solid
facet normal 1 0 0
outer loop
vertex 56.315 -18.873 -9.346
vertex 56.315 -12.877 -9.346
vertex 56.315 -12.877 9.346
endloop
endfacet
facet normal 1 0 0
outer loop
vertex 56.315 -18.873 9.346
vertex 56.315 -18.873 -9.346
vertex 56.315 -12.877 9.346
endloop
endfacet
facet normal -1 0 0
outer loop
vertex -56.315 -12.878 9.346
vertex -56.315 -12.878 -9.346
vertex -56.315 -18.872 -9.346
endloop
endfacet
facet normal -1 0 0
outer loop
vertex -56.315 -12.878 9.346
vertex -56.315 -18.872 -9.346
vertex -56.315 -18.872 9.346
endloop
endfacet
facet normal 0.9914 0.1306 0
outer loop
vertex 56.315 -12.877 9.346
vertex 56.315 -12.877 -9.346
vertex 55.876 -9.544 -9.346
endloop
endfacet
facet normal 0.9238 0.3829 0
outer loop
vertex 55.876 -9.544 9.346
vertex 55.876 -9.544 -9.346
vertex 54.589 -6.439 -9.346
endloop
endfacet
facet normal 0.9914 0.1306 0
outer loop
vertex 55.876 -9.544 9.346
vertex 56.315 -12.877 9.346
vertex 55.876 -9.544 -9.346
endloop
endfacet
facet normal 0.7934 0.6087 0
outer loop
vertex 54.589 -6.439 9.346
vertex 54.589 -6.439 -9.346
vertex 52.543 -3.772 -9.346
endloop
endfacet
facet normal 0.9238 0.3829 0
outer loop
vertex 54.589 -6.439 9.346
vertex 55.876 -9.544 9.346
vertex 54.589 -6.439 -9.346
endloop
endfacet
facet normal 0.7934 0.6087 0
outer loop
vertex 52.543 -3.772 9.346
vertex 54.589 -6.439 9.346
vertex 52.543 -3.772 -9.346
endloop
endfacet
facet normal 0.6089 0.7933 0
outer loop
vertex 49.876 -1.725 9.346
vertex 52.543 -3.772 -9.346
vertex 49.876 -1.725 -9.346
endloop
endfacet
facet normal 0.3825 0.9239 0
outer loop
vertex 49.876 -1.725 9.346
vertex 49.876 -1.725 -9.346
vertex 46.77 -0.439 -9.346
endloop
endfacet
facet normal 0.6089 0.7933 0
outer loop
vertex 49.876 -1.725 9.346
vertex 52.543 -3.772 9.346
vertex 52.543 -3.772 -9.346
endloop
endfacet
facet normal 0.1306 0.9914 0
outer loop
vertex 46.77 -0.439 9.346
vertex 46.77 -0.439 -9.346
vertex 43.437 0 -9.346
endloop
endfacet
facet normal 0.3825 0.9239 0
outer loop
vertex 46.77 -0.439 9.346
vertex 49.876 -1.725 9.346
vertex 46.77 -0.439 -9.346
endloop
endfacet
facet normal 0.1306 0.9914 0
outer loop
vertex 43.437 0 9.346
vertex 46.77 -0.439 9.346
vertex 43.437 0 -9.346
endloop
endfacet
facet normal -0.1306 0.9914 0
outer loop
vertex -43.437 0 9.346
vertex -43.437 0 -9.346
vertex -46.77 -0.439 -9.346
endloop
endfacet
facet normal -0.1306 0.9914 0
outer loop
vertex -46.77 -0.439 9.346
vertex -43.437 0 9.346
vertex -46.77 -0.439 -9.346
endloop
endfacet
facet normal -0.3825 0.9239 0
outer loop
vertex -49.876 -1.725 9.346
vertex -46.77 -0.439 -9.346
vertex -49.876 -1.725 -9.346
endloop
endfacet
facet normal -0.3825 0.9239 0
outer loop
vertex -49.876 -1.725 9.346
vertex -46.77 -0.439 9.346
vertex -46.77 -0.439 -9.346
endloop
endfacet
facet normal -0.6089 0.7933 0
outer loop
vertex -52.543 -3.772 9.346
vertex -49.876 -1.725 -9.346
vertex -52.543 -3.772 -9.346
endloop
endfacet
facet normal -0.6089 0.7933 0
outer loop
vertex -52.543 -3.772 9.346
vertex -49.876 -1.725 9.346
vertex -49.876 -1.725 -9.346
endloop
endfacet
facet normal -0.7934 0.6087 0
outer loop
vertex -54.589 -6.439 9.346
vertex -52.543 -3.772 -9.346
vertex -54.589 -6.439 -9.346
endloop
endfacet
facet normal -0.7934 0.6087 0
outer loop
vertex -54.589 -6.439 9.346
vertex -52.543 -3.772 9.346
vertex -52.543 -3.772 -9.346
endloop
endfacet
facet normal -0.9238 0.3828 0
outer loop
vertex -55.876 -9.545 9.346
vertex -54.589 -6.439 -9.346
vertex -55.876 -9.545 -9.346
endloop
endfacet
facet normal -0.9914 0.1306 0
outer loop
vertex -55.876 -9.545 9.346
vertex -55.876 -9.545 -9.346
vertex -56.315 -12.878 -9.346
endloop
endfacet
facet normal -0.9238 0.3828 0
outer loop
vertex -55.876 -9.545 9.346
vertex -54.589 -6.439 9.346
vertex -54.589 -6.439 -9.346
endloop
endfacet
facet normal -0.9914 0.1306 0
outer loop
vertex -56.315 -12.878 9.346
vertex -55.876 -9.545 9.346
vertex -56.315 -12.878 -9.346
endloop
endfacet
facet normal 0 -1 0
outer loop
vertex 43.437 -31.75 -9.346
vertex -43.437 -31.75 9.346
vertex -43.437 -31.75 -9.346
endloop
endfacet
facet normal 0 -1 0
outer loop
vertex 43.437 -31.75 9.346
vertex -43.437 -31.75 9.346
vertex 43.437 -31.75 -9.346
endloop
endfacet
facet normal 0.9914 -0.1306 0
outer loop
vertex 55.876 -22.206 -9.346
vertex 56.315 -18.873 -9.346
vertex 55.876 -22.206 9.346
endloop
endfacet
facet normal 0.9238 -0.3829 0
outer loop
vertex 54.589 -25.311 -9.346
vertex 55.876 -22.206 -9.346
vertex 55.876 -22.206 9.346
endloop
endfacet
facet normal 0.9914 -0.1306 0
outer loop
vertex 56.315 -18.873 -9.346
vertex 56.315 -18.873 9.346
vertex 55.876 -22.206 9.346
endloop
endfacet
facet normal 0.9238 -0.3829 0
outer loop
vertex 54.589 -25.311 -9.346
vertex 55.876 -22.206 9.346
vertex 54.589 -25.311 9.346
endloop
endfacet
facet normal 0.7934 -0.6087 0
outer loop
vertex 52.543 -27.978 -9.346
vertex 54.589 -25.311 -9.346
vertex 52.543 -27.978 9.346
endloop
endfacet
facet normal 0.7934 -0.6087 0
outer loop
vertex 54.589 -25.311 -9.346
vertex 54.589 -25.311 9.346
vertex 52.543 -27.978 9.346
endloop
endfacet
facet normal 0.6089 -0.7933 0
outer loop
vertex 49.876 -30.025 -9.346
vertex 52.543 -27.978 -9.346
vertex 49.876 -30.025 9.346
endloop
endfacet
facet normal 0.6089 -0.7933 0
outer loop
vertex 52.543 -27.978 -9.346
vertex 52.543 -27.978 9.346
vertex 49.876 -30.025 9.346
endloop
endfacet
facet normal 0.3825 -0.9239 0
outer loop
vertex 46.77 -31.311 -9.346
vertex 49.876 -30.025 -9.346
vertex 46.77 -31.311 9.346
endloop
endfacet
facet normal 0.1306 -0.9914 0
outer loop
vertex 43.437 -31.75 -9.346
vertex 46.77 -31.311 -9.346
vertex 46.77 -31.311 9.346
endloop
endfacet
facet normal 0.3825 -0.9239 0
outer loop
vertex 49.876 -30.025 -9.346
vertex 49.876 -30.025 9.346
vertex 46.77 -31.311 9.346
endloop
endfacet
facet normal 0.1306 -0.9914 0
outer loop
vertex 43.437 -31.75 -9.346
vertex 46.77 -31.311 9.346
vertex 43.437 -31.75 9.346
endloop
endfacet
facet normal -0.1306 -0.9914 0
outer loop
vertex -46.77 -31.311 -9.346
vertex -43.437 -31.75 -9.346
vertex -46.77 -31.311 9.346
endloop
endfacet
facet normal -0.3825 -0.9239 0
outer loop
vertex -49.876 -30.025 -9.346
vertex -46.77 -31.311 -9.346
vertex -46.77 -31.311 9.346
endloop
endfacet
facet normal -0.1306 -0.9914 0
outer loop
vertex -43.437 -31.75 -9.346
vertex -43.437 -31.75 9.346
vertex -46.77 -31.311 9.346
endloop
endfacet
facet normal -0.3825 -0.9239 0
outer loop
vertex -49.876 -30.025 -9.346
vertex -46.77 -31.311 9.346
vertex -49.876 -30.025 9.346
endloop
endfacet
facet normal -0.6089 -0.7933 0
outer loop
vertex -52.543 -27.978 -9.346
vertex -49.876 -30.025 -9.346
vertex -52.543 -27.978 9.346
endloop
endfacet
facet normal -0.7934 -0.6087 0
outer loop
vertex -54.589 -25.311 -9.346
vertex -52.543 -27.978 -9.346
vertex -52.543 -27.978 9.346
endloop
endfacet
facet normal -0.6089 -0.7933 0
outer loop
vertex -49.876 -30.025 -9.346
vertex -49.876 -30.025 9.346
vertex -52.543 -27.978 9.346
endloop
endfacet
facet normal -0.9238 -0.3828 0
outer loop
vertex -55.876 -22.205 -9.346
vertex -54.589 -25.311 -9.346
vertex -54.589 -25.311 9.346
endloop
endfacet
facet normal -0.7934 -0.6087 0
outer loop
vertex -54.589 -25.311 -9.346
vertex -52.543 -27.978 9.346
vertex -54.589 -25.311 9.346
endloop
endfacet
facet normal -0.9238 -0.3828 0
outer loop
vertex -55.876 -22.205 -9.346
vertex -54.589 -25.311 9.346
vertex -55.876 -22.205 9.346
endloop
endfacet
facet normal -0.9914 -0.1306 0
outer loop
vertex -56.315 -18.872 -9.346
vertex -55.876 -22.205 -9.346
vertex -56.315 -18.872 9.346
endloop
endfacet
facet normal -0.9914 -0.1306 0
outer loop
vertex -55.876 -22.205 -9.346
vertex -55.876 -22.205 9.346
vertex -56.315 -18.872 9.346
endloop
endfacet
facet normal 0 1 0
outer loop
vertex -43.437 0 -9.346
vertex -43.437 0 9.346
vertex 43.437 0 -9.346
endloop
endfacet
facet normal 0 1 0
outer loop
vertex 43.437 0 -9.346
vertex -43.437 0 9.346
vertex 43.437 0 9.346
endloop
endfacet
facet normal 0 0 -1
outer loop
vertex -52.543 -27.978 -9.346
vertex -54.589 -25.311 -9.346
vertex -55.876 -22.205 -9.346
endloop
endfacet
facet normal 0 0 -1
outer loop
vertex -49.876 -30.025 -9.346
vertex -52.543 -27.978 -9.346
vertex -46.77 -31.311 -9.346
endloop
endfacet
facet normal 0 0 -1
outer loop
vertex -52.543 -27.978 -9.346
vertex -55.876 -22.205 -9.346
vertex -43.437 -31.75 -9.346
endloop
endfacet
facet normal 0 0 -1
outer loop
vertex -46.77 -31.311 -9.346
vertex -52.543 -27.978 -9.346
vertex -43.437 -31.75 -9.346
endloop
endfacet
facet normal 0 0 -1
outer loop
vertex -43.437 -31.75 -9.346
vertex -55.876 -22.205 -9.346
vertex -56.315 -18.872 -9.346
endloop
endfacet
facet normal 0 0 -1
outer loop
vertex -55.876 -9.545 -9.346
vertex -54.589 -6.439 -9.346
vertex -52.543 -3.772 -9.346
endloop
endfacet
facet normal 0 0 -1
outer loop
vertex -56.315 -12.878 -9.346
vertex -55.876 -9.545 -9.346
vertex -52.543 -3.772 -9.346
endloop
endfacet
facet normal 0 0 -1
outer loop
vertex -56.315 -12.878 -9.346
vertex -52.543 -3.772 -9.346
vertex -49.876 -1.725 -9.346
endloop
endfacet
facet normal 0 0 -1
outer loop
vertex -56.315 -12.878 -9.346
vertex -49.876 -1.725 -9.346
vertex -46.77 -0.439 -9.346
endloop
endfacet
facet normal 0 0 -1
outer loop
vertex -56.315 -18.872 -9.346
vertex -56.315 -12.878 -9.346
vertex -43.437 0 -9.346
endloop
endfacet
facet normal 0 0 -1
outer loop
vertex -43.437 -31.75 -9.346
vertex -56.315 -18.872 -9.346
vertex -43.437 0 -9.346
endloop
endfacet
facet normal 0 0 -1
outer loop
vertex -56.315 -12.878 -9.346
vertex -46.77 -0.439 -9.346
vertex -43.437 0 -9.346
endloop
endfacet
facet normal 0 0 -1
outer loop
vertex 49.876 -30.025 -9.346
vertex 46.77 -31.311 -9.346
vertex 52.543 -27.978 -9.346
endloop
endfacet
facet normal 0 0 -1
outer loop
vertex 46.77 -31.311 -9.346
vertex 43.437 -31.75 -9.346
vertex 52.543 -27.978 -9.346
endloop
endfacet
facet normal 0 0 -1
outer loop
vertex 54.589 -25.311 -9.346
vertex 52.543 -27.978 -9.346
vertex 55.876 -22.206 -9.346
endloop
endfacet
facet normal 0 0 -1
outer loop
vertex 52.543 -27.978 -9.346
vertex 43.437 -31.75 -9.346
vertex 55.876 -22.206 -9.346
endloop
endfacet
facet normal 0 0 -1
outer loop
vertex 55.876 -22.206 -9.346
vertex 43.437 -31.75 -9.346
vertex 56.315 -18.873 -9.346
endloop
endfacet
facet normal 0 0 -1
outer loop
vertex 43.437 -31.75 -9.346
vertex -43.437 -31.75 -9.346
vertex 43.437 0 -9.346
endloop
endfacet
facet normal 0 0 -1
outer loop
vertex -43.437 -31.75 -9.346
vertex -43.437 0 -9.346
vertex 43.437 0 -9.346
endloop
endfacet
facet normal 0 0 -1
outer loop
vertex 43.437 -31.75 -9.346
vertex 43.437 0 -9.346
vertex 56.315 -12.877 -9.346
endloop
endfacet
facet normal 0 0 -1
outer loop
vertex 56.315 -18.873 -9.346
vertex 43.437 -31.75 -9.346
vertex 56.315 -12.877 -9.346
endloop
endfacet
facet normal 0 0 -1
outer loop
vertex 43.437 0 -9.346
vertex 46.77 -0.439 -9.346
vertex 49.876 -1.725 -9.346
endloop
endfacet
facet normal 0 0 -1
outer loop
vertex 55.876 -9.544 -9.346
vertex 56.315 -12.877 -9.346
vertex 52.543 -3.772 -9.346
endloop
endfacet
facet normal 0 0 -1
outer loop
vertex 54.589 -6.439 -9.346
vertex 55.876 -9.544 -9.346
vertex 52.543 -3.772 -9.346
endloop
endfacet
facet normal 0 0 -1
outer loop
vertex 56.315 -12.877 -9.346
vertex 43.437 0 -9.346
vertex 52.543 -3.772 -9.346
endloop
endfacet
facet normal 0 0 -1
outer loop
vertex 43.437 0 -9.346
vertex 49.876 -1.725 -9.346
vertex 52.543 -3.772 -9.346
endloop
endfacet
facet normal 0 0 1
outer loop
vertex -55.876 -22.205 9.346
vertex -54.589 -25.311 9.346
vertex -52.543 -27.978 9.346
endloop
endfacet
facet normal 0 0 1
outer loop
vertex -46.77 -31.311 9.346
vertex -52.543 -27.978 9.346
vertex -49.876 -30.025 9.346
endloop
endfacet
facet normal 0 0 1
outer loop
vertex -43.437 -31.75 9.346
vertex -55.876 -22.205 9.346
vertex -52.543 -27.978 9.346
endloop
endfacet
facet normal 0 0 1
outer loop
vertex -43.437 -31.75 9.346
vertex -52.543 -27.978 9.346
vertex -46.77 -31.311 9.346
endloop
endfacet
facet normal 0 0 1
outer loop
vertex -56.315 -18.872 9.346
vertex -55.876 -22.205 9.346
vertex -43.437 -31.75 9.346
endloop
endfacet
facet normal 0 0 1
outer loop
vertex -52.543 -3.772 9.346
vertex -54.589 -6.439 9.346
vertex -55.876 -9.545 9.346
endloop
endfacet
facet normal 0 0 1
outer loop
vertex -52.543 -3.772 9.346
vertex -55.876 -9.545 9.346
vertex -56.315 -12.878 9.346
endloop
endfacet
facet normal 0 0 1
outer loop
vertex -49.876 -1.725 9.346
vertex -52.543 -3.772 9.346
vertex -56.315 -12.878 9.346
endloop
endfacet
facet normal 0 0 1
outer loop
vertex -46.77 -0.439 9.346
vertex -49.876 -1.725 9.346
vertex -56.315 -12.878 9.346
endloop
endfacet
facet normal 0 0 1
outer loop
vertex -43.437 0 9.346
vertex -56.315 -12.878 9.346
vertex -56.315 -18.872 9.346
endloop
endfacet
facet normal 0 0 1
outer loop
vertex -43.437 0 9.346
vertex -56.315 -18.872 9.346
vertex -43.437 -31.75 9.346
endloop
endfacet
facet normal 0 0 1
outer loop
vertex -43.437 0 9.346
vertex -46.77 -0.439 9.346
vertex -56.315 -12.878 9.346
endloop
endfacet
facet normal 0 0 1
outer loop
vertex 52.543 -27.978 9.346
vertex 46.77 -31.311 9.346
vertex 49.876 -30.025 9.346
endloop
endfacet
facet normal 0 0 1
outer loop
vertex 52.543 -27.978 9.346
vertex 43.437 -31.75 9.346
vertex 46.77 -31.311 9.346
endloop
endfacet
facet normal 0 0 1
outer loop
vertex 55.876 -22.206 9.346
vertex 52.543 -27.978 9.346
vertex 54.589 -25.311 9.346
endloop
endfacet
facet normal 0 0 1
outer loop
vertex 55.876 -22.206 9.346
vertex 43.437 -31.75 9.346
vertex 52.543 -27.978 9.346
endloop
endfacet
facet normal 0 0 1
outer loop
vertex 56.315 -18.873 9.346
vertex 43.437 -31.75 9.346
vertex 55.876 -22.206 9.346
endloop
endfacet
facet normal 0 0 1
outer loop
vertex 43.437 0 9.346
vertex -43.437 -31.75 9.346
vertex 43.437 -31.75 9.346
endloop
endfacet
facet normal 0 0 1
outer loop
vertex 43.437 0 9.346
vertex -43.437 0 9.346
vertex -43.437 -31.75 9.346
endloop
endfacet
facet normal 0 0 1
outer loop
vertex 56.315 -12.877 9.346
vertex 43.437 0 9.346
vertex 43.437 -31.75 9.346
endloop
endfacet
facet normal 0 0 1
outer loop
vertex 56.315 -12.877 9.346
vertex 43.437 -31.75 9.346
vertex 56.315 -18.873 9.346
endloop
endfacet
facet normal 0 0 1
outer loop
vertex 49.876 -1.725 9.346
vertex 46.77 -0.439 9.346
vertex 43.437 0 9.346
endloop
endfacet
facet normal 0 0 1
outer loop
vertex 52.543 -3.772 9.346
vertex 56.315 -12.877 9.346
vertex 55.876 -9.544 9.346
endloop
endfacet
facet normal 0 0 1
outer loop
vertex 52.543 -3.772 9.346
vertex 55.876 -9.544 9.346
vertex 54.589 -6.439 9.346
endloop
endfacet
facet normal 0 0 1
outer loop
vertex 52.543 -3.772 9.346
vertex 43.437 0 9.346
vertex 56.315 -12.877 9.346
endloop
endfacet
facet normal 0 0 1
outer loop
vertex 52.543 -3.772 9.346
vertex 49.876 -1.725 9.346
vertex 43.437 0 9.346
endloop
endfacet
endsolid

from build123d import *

# Parameters (mm, degrees)
F0_W     = 112.629154
F0_H     = 18.691752
F1_DEPTH = 31.75
F2_R     = 12.877415
F3_R     = 12.8778


with BuildPart() as f1:
    # F0 (on Front) → F1 (new body)
    with BuildSketch(Plane.XZ):
        Rectangle(F0_W, F0_H)
    extrude(amount=F1_DEPTH)

    # F2
    f2_edges = [f1.edges().sort_by_distance(p)[0] for p in [
        (56.314577, 0, 0),
        (56.314577, -31.75, 0),
    ]]
    fillet(f2_edges, radius=F2_R)

    # F3
    f3_edges = [f1.edges().sort_by_distance(p)[0] for p in [
        (-56.314577, 0, 0),
        (-56.314577, -31.75, 0),
    ]]
    fillet(f3_edges, radius=F3_R)


solid = f1.part
